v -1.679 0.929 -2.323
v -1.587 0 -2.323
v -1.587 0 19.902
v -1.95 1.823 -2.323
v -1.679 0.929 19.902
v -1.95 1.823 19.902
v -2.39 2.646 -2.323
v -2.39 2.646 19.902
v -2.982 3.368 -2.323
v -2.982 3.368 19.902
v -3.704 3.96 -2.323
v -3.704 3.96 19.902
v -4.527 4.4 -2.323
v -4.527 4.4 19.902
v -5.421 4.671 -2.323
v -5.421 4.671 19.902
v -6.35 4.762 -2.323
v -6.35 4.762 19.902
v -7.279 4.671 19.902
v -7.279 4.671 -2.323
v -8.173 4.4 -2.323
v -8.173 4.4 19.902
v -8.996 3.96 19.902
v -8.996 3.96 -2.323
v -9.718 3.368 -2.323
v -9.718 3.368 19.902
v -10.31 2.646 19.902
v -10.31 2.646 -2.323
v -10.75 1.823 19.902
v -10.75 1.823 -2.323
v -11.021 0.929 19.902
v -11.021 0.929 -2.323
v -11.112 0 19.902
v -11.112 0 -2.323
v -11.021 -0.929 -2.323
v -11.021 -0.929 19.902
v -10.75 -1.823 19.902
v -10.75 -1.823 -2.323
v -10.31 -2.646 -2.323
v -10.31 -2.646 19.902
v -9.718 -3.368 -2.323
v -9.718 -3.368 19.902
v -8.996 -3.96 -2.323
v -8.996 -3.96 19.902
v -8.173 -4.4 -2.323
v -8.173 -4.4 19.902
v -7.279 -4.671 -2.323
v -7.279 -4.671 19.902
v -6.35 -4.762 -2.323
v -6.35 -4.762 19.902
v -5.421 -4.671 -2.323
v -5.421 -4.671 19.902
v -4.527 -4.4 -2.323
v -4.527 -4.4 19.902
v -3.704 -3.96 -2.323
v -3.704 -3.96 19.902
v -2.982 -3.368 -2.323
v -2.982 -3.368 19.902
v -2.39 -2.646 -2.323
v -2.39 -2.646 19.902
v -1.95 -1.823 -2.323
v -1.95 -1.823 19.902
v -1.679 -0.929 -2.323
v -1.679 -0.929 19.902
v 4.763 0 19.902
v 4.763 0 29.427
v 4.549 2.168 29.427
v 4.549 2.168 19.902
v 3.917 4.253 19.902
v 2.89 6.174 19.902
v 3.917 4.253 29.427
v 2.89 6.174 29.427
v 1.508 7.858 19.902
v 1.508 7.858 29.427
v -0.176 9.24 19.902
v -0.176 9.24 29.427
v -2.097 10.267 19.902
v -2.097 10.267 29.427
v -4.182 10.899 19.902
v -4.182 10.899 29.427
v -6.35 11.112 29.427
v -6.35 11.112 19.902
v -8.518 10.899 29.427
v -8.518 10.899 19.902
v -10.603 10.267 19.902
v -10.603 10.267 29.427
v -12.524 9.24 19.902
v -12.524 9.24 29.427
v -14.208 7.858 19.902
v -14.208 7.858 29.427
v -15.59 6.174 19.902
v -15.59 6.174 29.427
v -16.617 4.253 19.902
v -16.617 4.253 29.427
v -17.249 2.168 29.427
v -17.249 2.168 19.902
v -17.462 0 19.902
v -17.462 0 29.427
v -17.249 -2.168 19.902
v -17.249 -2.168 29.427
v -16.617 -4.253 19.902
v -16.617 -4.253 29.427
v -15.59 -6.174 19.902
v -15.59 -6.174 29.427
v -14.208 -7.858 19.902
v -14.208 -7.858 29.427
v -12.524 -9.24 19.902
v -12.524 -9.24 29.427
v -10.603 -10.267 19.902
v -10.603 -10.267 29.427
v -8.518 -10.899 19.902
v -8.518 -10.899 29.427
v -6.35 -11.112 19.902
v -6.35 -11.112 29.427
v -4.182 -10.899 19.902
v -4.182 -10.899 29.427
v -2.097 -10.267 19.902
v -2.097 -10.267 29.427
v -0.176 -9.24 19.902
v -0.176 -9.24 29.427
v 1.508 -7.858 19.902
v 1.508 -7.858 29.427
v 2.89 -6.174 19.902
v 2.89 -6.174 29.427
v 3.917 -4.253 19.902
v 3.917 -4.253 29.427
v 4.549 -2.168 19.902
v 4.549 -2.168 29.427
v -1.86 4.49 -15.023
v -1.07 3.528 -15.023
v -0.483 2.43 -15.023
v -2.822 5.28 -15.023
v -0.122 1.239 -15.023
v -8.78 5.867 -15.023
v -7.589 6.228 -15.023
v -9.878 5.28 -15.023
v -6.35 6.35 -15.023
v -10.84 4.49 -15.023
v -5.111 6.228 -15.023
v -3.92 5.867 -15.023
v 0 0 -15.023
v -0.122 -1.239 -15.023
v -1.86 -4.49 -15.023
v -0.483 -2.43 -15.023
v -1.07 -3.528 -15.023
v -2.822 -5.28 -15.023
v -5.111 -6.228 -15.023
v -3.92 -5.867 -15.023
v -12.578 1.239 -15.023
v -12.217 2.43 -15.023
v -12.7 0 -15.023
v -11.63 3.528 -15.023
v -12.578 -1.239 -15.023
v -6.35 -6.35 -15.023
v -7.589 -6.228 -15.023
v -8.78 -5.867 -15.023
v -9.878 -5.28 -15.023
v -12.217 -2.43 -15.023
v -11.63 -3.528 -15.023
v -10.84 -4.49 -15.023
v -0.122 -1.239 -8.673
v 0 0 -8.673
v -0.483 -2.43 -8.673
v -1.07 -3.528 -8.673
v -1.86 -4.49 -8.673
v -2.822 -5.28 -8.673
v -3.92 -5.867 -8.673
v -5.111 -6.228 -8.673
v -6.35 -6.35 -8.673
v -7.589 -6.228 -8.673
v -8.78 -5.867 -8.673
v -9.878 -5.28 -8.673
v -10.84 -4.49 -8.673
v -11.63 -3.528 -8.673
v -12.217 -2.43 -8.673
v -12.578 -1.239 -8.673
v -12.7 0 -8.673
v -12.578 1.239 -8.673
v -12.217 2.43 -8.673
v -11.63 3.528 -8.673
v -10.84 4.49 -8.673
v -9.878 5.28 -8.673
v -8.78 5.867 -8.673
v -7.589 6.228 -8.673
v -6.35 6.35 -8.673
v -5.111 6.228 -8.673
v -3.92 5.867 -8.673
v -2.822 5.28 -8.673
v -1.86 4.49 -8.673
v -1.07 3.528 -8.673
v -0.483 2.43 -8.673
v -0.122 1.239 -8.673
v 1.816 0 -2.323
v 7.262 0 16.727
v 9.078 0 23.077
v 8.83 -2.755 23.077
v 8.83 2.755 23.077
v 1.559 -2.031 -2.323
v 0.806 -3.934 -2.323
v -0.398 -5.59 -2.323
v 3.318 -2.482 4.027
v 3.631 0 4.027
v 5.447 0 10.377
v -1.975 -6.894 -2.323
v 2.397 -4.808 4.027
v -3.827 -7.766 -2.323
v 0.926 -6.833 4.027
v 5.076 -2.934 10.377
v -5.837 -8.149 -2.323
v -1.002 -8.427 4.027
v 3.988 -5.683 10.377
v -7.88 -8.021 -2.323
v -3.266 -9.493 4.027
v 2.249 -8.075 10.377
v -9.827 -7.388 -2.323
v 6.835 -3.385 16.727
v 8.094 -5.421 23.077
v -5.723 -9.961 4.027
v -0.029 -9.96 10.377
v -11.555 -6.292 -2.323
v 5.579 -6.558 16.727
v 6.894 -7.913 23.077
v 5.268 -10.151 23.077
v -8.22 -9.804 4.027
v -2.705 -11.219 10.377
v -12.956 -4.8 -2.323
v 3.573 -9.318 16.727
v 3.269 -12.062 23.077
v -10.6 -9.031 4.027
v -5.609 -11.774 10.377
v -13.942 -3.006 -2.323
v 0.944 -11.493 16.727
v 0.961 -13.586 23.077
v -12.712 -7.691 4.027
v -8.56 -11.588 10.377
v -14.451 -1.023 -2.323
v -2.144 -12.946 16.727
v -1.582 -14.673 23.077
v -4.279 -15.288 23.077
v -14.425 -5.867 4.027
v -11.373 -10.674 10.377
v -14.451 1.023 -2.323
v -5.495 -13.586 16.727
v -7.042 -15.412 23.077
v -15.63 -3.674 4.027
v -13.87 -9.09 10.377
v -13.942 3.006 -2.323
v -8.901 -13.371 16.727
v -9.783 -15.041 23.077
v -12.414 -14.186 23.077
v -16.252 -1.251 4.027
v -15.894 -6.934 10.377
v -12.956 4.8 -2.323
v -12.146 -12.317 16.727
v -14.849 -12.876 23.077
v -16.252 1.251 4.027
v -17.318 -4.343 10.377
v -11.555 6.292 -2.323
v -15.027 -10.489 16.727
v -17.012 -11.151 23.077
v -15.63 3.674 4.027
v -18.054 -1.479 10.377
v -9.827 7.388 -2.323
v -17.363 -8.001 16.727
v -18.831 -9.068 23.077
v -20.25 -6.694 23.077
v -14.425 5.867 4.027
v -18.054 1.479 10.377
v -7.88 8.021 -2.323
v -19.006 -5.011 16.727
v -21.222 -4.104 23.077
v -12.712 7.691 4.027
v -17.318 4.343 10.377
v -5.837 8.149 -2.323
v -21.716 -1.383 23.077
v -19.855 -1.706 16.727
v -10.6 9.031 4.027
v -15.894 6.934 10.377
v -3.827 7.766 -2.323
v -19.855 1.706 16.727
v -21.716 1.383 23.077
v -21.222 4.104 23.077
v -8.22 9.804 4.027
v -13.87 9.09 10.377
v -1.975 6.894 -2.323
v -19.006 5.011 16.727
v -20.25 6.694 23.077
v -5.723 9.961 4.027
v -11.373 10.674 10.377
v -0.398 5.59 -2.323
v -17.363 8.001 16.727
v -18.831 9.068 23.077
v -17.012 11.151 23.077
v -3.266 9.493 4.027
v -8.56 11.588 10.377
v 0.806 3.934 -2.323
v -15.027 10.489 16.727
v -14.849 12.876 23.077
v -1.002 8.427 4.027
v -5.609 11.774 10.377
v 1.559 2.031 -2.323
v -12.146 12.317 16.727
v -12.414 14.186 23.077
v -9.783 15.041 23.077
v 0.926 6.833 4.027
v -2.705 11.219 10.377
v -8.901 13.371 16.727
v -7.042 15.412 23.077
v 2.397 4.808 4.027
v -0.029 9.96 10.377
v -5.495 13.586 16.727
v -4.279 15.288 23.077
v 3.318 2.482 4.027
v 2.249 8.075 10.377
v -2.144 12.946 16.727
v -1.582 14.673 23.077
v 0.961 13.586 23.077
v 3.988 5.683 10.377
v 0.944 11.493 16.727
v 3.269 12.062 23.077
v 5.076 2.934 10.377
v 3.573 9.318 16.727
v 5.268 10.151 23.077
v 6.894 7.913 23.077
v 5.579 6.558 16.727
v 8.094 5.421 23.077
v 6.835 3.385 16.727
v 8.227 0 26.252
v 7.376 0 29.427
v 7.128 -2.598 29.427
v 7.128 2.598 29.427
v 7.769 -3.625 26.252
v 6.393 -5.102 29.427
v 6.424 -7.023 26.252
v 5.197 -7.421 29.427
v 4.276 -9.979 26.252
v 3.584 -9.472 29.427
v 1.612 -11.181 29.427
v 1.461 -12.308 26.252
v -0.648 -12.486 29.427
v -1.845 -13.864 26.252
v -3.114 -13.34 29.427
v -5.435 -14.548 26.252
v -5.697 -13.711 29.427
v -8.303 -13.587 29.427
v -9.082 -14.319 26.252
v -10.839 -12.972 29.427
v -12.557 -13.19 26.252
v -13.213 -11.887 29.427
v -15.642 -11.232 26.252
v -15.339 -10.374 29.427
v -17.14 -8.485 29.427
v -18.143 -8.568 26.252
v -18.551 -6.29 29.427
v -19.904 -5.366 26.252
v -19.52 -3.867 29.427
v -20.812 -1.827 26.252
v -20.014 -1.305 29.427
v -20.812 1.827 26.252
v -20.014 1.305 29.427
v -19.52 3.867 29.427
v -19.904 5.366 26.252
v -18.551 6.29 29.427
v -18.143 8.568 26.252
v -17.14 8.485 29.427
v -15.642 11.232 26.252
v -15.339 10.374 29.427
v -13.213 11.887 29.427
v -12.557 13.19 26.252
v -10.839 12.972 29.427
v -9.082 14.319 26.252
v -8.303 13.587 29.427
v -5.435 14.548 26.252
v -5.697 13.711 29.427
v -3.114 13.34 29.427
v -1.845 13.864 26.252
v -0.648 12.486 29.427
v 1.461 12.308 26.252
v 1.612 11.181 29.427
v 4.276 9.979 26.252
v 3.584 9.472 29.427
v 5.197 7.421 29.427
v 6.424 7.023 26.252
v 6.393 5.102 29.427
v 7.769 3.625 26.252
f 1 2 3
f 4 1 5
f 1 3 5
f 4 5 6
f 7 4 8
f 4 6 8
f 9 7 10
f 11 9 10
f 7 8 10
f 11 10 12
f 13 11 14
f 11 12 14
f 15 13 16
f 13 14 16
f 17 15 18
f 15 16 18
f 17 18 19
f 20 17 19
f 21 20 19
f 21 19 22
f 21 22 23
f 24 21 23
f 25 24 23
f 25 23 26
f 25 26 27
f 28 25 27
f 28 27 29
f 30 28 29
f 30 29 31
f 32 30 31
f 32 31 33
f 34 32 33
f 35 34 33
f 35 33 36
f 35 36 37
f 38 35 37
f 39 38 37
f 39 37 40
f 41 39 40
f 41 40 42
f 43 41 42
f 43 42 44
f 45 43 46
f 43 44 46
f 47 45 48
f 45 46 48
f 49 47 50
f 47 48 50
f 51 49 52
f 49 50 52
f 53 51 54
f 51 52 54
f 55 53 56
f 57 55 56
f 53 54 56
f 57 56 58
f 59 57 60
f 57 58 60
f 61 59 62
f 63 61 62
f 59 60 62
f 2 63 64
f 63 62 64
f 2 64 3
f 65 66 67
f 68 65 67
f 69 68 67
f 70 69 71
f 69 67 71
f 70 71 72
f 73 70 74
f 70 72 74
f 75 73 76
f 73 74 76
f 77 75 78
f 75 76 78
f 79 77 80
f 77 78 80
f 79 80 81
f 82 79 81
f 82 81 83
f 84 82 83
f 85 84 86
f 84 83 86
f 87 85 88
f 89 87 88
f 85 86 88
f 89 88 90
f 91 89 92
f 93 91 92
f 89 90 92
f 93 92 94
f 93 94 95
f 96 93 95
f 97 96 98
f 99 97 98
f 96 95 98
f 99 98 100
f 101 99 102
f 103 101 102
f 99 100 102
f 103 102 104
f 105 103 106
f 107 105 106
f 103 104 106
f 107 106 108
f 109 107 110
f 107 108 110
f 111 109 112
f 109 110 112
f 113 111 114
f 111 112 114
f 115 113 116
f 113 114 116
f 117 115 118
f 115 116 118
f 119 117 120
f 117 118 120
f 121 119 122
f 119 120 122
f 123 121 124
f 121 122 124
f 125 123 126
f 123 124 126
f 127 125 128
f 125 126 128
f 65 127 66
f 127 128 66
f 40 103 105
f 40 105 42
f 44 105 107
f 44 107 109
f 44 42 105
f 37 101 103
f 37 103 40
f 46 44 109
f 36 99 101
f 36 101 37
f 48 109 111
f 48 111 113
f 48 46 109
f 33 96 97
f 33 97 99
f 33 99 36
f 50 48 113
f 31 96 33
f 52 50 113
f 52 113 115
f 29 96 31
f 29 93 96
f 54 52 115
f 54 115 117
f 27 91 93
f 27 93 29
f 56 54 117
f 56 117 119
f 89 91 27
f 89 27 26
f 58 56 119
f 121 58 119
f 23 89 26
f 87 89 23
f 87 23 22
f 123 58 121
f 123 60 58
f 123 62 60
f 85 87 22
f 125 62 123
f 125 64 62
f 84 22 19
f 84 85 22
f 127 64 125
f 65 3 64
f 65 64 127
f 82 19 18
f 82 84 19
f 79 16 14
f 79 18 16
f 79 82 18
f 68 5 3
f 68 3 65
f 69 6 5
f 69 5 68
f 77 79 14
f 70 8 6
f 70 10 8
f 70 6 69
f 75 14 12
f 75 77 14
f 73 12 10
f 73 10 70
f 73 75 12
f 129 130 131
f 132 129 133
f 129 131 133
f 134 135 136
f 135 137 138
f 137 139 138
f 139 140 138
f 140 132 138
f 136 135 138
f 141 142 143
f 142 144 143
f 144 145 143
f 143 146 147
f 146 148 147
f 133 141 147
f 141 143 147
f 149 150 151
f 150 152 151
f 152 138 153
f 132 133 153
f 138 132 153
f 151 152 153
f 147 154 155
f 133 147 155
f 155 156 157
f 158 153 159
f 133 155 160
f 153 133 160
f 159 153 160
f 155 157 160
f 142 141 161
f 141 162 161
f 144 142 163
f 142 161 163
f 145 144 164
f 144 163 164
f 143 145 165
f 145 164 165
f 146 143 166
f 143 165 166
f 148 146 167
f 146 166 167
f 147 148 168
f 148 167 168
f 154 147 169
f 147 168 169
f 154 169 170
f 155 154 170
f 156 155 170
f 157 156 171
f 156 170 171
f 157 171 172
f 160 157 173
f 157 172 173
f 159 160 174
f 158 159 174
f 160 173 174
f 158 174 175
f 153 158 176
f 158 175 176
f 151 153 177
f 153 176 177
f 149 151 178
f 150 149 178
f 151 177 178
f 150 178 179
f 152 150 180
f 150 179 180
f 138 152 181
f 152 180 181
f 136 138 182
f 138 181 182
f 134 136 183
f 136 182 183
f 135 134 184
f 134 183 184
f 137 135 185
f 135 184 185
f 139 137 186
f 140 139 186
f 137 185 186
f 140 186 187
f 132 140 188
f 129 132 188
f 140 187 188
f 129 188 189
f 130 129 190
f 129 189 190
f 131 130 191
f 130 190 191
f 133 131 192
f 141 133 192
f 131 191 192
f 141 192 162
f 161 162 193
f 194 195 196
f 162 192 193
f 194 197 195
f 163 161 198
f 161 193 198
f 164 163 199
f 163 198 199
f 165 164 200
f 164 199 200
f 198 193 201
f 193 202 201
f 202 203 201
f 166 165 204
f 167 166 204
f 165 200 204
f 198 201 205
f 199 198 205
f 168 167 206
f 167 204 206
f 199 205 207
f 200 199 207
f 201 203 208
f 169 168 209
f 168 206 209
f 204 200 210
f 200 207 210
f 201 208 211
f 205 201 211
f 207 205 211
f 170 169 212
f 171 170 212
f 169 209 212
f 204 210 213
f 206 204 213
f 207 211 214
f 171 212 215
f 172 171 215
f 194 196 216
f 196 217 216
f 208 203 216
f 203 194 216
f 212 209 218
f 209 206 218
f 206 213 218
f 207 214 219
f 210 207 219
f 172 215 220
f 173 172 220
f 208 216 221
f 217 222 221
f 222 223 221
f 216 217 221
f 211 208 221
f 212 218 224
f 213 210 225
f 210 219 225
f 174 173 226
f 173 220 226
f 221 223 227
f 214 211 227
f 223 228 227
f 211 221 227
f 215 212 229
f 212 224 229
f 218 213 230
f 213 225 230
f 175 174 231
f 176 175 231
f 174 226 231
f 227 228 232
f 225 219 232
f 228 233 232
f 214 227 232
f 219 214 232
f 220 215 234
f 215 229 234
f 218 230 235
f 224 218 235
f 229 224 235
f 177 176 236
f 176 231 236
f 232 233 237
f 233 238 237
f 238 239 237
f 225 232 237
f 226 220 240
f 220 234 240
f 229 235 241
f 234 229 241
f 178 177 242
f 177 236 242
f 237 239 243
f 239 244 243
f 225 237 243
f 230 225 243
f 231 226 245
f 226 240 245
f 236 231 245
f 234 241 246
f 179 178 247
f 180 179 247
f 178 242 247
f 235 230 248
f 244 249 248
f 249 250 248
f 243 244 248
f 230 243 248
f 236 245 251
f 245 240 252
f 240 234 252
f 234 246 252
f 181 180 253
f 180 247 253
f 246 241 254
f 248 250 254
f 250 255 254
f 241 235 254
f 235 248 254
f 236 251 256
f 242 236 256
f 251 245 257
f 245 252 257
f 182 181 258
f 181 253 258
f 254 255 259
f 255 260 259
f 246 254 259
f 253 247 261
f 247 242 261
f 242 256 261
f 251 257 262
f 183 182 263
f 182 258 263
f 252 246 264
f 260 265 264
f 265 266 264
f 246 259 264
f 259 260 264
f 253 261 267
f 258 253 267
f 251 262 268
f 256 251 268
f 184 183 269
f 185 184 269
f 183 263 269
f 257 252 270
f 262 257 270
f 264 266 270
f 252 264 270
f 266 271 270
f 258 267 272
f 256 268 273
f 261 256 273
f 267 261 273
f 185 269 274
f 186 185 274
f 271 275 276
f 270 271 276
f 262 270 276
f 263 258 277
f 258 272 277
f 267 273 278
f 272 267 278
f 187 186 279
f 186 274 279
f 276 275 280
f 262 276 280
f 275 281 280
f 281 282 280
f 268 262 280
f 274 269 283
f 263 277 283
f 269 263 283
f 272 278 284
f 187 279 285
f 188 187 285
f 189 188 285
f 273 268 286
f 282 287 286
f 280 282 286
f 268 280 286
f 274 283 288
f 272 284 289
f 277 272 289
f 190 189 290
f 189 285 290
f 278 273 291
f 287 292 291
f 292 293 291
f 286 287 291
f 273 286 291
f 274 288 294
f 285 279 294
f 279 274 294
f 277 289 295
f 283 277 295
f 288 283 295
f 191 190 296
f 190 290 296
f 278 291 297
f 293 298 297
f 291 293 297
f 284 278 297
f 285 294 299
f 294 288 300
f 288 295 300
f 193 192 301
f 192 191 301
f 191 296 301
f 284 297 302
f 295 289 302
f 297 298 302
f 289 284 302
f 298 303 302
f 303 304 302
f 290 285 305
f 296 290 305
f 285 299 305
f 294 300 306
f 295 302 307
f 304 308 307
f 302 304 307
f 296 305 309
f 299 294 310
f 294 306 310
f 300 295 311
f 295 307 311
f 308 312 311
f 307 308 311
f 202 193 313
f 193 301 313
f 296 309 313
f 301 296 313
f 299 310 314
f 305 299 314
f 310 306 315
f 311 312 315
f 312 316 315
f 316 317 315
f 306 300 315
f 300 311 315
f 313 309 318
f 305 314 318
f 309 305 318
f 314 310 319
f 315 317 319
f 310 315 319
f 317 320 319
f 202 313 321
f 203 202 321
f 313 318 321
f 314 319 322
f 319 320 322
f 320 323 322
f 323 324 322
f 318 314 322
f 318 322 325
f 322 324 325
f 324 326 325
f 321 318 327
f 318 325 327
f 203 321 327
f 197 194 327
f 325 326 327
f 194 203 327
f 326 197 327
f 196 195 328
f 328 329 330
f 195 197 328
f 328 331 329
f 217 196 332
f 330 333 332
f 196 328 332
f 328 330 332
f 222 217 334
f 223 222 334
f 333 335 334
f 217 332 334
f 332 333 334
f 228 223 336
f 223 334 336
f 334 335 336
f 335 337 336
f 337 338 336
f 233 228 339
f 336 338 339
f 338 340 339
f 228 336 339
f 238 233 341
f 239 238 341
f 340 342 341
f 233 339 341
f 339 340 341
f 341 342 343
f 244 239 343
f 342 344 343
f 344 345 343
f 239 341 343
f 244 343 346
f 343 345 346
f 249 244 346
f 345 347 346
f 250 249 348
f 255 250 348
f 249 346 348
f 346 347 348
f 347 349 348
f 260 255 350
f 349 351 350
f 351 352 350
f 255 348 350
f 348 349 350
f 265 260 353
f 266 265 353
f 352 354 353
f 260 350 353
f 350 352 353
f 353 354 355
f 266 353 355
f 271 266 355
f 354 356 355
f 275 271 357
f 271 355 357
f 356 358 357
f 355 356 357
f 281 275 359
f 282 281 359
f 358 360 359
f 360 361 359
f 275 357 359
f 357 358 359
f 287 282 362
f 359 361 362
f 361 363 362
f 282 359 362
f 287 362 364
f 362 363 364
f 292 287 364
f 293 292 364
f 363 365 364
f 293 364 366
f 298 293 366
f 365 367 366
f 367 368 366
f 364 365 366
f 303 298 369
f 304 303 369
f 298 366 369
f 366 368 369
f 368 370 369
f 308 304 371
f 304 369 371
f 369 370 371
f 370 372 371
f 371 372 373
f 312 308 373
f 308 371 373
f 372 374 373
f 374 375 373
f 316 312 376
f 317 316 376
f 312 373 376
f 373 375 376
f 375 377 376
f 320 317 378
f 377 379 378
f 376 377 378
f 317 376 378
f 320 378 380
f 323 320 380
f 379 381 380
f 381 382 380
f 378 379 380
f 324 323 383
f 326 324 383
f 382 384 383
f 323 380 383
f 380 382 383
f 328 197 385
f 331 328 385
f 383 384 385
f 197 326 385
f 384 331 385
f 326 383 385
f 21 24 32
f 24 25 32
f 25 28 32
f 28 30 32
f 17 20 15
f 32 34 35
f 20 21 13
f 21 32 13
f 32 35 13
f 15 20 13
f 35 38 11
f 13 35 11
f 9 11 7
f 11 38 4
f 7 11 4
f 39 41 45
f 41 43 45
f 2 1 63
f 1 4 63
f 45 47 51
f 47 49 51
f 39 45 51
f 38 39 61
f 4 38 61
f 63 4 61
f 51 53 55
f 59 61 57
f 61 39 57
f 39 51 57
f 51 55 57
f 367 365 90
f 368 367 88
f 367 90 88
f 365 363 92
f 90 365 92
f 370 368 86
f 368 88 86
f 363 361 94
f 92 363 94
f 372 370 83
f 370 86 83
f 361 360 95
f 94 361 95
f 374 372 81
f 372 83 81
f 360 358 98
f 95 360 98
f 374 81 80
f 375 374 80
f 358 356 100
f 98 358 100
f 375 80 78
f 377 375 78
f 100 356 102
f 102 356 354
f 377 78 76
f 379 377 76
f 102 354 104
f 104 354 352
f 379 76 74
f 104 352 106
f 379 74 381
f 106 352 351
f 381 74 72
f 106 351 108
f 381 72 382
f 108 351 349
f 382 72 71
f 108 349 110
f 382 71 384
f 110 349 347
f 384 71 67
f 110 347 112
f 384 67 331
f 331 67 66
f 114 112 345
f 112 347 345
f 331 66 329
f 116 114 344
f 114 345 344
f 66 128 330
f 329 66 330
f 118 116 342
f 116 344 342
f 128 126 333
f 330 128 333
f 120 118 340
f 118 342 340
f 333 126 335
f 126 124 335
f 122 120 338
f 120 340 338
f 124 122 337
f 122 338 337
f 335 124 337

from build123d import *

# Parameters (mm, degrees)
F2_R     = 11.1125
F2_R_2   = 4.7625
F3_DEPTH = 9.525
F4_DEPTH = 31.75


with BuildPart() as f1:
    # F0 (on Front) → F1 (revolve)
    with BuildSketch(Plane.XZ):
        Polygon((-6.35, 29.4268268501), (-6.35, -15.0231731499), (0, -15.0231731499), (0, -8.6731731499), (9.0779721894, 23.0768268501), (7.3764948174, 29.4268268501), align=None)
    revolve(axis=Axis((-6.35, 0, 7.2018268501), (0, 0, -1)))

    # F2 (on face) → F3 (cut)
    with BuildSketch(Plane.XY.offset(29.4268268501)):
        with Locations((-6.35, 0)):
            Circle(F2_R)
        with Locations((-6.35, 0)):
            Circle(F2_R_2, mode=Mode.SUBTRACT)
    extrude(amount=-F3_DEPTH, mode=Mode.SUBTRACT)

    # F4 (cut): a face of the model
    f4_faces = [f1.faces().sort_by_distance(p)[0] for p in [
        (-6.35, 0, 29.4268268501),
    ]]
    extrude(f4_faces, amount=-F4_DEPTH, mode=Mode.SUBTRACT)


solid = f1.part
